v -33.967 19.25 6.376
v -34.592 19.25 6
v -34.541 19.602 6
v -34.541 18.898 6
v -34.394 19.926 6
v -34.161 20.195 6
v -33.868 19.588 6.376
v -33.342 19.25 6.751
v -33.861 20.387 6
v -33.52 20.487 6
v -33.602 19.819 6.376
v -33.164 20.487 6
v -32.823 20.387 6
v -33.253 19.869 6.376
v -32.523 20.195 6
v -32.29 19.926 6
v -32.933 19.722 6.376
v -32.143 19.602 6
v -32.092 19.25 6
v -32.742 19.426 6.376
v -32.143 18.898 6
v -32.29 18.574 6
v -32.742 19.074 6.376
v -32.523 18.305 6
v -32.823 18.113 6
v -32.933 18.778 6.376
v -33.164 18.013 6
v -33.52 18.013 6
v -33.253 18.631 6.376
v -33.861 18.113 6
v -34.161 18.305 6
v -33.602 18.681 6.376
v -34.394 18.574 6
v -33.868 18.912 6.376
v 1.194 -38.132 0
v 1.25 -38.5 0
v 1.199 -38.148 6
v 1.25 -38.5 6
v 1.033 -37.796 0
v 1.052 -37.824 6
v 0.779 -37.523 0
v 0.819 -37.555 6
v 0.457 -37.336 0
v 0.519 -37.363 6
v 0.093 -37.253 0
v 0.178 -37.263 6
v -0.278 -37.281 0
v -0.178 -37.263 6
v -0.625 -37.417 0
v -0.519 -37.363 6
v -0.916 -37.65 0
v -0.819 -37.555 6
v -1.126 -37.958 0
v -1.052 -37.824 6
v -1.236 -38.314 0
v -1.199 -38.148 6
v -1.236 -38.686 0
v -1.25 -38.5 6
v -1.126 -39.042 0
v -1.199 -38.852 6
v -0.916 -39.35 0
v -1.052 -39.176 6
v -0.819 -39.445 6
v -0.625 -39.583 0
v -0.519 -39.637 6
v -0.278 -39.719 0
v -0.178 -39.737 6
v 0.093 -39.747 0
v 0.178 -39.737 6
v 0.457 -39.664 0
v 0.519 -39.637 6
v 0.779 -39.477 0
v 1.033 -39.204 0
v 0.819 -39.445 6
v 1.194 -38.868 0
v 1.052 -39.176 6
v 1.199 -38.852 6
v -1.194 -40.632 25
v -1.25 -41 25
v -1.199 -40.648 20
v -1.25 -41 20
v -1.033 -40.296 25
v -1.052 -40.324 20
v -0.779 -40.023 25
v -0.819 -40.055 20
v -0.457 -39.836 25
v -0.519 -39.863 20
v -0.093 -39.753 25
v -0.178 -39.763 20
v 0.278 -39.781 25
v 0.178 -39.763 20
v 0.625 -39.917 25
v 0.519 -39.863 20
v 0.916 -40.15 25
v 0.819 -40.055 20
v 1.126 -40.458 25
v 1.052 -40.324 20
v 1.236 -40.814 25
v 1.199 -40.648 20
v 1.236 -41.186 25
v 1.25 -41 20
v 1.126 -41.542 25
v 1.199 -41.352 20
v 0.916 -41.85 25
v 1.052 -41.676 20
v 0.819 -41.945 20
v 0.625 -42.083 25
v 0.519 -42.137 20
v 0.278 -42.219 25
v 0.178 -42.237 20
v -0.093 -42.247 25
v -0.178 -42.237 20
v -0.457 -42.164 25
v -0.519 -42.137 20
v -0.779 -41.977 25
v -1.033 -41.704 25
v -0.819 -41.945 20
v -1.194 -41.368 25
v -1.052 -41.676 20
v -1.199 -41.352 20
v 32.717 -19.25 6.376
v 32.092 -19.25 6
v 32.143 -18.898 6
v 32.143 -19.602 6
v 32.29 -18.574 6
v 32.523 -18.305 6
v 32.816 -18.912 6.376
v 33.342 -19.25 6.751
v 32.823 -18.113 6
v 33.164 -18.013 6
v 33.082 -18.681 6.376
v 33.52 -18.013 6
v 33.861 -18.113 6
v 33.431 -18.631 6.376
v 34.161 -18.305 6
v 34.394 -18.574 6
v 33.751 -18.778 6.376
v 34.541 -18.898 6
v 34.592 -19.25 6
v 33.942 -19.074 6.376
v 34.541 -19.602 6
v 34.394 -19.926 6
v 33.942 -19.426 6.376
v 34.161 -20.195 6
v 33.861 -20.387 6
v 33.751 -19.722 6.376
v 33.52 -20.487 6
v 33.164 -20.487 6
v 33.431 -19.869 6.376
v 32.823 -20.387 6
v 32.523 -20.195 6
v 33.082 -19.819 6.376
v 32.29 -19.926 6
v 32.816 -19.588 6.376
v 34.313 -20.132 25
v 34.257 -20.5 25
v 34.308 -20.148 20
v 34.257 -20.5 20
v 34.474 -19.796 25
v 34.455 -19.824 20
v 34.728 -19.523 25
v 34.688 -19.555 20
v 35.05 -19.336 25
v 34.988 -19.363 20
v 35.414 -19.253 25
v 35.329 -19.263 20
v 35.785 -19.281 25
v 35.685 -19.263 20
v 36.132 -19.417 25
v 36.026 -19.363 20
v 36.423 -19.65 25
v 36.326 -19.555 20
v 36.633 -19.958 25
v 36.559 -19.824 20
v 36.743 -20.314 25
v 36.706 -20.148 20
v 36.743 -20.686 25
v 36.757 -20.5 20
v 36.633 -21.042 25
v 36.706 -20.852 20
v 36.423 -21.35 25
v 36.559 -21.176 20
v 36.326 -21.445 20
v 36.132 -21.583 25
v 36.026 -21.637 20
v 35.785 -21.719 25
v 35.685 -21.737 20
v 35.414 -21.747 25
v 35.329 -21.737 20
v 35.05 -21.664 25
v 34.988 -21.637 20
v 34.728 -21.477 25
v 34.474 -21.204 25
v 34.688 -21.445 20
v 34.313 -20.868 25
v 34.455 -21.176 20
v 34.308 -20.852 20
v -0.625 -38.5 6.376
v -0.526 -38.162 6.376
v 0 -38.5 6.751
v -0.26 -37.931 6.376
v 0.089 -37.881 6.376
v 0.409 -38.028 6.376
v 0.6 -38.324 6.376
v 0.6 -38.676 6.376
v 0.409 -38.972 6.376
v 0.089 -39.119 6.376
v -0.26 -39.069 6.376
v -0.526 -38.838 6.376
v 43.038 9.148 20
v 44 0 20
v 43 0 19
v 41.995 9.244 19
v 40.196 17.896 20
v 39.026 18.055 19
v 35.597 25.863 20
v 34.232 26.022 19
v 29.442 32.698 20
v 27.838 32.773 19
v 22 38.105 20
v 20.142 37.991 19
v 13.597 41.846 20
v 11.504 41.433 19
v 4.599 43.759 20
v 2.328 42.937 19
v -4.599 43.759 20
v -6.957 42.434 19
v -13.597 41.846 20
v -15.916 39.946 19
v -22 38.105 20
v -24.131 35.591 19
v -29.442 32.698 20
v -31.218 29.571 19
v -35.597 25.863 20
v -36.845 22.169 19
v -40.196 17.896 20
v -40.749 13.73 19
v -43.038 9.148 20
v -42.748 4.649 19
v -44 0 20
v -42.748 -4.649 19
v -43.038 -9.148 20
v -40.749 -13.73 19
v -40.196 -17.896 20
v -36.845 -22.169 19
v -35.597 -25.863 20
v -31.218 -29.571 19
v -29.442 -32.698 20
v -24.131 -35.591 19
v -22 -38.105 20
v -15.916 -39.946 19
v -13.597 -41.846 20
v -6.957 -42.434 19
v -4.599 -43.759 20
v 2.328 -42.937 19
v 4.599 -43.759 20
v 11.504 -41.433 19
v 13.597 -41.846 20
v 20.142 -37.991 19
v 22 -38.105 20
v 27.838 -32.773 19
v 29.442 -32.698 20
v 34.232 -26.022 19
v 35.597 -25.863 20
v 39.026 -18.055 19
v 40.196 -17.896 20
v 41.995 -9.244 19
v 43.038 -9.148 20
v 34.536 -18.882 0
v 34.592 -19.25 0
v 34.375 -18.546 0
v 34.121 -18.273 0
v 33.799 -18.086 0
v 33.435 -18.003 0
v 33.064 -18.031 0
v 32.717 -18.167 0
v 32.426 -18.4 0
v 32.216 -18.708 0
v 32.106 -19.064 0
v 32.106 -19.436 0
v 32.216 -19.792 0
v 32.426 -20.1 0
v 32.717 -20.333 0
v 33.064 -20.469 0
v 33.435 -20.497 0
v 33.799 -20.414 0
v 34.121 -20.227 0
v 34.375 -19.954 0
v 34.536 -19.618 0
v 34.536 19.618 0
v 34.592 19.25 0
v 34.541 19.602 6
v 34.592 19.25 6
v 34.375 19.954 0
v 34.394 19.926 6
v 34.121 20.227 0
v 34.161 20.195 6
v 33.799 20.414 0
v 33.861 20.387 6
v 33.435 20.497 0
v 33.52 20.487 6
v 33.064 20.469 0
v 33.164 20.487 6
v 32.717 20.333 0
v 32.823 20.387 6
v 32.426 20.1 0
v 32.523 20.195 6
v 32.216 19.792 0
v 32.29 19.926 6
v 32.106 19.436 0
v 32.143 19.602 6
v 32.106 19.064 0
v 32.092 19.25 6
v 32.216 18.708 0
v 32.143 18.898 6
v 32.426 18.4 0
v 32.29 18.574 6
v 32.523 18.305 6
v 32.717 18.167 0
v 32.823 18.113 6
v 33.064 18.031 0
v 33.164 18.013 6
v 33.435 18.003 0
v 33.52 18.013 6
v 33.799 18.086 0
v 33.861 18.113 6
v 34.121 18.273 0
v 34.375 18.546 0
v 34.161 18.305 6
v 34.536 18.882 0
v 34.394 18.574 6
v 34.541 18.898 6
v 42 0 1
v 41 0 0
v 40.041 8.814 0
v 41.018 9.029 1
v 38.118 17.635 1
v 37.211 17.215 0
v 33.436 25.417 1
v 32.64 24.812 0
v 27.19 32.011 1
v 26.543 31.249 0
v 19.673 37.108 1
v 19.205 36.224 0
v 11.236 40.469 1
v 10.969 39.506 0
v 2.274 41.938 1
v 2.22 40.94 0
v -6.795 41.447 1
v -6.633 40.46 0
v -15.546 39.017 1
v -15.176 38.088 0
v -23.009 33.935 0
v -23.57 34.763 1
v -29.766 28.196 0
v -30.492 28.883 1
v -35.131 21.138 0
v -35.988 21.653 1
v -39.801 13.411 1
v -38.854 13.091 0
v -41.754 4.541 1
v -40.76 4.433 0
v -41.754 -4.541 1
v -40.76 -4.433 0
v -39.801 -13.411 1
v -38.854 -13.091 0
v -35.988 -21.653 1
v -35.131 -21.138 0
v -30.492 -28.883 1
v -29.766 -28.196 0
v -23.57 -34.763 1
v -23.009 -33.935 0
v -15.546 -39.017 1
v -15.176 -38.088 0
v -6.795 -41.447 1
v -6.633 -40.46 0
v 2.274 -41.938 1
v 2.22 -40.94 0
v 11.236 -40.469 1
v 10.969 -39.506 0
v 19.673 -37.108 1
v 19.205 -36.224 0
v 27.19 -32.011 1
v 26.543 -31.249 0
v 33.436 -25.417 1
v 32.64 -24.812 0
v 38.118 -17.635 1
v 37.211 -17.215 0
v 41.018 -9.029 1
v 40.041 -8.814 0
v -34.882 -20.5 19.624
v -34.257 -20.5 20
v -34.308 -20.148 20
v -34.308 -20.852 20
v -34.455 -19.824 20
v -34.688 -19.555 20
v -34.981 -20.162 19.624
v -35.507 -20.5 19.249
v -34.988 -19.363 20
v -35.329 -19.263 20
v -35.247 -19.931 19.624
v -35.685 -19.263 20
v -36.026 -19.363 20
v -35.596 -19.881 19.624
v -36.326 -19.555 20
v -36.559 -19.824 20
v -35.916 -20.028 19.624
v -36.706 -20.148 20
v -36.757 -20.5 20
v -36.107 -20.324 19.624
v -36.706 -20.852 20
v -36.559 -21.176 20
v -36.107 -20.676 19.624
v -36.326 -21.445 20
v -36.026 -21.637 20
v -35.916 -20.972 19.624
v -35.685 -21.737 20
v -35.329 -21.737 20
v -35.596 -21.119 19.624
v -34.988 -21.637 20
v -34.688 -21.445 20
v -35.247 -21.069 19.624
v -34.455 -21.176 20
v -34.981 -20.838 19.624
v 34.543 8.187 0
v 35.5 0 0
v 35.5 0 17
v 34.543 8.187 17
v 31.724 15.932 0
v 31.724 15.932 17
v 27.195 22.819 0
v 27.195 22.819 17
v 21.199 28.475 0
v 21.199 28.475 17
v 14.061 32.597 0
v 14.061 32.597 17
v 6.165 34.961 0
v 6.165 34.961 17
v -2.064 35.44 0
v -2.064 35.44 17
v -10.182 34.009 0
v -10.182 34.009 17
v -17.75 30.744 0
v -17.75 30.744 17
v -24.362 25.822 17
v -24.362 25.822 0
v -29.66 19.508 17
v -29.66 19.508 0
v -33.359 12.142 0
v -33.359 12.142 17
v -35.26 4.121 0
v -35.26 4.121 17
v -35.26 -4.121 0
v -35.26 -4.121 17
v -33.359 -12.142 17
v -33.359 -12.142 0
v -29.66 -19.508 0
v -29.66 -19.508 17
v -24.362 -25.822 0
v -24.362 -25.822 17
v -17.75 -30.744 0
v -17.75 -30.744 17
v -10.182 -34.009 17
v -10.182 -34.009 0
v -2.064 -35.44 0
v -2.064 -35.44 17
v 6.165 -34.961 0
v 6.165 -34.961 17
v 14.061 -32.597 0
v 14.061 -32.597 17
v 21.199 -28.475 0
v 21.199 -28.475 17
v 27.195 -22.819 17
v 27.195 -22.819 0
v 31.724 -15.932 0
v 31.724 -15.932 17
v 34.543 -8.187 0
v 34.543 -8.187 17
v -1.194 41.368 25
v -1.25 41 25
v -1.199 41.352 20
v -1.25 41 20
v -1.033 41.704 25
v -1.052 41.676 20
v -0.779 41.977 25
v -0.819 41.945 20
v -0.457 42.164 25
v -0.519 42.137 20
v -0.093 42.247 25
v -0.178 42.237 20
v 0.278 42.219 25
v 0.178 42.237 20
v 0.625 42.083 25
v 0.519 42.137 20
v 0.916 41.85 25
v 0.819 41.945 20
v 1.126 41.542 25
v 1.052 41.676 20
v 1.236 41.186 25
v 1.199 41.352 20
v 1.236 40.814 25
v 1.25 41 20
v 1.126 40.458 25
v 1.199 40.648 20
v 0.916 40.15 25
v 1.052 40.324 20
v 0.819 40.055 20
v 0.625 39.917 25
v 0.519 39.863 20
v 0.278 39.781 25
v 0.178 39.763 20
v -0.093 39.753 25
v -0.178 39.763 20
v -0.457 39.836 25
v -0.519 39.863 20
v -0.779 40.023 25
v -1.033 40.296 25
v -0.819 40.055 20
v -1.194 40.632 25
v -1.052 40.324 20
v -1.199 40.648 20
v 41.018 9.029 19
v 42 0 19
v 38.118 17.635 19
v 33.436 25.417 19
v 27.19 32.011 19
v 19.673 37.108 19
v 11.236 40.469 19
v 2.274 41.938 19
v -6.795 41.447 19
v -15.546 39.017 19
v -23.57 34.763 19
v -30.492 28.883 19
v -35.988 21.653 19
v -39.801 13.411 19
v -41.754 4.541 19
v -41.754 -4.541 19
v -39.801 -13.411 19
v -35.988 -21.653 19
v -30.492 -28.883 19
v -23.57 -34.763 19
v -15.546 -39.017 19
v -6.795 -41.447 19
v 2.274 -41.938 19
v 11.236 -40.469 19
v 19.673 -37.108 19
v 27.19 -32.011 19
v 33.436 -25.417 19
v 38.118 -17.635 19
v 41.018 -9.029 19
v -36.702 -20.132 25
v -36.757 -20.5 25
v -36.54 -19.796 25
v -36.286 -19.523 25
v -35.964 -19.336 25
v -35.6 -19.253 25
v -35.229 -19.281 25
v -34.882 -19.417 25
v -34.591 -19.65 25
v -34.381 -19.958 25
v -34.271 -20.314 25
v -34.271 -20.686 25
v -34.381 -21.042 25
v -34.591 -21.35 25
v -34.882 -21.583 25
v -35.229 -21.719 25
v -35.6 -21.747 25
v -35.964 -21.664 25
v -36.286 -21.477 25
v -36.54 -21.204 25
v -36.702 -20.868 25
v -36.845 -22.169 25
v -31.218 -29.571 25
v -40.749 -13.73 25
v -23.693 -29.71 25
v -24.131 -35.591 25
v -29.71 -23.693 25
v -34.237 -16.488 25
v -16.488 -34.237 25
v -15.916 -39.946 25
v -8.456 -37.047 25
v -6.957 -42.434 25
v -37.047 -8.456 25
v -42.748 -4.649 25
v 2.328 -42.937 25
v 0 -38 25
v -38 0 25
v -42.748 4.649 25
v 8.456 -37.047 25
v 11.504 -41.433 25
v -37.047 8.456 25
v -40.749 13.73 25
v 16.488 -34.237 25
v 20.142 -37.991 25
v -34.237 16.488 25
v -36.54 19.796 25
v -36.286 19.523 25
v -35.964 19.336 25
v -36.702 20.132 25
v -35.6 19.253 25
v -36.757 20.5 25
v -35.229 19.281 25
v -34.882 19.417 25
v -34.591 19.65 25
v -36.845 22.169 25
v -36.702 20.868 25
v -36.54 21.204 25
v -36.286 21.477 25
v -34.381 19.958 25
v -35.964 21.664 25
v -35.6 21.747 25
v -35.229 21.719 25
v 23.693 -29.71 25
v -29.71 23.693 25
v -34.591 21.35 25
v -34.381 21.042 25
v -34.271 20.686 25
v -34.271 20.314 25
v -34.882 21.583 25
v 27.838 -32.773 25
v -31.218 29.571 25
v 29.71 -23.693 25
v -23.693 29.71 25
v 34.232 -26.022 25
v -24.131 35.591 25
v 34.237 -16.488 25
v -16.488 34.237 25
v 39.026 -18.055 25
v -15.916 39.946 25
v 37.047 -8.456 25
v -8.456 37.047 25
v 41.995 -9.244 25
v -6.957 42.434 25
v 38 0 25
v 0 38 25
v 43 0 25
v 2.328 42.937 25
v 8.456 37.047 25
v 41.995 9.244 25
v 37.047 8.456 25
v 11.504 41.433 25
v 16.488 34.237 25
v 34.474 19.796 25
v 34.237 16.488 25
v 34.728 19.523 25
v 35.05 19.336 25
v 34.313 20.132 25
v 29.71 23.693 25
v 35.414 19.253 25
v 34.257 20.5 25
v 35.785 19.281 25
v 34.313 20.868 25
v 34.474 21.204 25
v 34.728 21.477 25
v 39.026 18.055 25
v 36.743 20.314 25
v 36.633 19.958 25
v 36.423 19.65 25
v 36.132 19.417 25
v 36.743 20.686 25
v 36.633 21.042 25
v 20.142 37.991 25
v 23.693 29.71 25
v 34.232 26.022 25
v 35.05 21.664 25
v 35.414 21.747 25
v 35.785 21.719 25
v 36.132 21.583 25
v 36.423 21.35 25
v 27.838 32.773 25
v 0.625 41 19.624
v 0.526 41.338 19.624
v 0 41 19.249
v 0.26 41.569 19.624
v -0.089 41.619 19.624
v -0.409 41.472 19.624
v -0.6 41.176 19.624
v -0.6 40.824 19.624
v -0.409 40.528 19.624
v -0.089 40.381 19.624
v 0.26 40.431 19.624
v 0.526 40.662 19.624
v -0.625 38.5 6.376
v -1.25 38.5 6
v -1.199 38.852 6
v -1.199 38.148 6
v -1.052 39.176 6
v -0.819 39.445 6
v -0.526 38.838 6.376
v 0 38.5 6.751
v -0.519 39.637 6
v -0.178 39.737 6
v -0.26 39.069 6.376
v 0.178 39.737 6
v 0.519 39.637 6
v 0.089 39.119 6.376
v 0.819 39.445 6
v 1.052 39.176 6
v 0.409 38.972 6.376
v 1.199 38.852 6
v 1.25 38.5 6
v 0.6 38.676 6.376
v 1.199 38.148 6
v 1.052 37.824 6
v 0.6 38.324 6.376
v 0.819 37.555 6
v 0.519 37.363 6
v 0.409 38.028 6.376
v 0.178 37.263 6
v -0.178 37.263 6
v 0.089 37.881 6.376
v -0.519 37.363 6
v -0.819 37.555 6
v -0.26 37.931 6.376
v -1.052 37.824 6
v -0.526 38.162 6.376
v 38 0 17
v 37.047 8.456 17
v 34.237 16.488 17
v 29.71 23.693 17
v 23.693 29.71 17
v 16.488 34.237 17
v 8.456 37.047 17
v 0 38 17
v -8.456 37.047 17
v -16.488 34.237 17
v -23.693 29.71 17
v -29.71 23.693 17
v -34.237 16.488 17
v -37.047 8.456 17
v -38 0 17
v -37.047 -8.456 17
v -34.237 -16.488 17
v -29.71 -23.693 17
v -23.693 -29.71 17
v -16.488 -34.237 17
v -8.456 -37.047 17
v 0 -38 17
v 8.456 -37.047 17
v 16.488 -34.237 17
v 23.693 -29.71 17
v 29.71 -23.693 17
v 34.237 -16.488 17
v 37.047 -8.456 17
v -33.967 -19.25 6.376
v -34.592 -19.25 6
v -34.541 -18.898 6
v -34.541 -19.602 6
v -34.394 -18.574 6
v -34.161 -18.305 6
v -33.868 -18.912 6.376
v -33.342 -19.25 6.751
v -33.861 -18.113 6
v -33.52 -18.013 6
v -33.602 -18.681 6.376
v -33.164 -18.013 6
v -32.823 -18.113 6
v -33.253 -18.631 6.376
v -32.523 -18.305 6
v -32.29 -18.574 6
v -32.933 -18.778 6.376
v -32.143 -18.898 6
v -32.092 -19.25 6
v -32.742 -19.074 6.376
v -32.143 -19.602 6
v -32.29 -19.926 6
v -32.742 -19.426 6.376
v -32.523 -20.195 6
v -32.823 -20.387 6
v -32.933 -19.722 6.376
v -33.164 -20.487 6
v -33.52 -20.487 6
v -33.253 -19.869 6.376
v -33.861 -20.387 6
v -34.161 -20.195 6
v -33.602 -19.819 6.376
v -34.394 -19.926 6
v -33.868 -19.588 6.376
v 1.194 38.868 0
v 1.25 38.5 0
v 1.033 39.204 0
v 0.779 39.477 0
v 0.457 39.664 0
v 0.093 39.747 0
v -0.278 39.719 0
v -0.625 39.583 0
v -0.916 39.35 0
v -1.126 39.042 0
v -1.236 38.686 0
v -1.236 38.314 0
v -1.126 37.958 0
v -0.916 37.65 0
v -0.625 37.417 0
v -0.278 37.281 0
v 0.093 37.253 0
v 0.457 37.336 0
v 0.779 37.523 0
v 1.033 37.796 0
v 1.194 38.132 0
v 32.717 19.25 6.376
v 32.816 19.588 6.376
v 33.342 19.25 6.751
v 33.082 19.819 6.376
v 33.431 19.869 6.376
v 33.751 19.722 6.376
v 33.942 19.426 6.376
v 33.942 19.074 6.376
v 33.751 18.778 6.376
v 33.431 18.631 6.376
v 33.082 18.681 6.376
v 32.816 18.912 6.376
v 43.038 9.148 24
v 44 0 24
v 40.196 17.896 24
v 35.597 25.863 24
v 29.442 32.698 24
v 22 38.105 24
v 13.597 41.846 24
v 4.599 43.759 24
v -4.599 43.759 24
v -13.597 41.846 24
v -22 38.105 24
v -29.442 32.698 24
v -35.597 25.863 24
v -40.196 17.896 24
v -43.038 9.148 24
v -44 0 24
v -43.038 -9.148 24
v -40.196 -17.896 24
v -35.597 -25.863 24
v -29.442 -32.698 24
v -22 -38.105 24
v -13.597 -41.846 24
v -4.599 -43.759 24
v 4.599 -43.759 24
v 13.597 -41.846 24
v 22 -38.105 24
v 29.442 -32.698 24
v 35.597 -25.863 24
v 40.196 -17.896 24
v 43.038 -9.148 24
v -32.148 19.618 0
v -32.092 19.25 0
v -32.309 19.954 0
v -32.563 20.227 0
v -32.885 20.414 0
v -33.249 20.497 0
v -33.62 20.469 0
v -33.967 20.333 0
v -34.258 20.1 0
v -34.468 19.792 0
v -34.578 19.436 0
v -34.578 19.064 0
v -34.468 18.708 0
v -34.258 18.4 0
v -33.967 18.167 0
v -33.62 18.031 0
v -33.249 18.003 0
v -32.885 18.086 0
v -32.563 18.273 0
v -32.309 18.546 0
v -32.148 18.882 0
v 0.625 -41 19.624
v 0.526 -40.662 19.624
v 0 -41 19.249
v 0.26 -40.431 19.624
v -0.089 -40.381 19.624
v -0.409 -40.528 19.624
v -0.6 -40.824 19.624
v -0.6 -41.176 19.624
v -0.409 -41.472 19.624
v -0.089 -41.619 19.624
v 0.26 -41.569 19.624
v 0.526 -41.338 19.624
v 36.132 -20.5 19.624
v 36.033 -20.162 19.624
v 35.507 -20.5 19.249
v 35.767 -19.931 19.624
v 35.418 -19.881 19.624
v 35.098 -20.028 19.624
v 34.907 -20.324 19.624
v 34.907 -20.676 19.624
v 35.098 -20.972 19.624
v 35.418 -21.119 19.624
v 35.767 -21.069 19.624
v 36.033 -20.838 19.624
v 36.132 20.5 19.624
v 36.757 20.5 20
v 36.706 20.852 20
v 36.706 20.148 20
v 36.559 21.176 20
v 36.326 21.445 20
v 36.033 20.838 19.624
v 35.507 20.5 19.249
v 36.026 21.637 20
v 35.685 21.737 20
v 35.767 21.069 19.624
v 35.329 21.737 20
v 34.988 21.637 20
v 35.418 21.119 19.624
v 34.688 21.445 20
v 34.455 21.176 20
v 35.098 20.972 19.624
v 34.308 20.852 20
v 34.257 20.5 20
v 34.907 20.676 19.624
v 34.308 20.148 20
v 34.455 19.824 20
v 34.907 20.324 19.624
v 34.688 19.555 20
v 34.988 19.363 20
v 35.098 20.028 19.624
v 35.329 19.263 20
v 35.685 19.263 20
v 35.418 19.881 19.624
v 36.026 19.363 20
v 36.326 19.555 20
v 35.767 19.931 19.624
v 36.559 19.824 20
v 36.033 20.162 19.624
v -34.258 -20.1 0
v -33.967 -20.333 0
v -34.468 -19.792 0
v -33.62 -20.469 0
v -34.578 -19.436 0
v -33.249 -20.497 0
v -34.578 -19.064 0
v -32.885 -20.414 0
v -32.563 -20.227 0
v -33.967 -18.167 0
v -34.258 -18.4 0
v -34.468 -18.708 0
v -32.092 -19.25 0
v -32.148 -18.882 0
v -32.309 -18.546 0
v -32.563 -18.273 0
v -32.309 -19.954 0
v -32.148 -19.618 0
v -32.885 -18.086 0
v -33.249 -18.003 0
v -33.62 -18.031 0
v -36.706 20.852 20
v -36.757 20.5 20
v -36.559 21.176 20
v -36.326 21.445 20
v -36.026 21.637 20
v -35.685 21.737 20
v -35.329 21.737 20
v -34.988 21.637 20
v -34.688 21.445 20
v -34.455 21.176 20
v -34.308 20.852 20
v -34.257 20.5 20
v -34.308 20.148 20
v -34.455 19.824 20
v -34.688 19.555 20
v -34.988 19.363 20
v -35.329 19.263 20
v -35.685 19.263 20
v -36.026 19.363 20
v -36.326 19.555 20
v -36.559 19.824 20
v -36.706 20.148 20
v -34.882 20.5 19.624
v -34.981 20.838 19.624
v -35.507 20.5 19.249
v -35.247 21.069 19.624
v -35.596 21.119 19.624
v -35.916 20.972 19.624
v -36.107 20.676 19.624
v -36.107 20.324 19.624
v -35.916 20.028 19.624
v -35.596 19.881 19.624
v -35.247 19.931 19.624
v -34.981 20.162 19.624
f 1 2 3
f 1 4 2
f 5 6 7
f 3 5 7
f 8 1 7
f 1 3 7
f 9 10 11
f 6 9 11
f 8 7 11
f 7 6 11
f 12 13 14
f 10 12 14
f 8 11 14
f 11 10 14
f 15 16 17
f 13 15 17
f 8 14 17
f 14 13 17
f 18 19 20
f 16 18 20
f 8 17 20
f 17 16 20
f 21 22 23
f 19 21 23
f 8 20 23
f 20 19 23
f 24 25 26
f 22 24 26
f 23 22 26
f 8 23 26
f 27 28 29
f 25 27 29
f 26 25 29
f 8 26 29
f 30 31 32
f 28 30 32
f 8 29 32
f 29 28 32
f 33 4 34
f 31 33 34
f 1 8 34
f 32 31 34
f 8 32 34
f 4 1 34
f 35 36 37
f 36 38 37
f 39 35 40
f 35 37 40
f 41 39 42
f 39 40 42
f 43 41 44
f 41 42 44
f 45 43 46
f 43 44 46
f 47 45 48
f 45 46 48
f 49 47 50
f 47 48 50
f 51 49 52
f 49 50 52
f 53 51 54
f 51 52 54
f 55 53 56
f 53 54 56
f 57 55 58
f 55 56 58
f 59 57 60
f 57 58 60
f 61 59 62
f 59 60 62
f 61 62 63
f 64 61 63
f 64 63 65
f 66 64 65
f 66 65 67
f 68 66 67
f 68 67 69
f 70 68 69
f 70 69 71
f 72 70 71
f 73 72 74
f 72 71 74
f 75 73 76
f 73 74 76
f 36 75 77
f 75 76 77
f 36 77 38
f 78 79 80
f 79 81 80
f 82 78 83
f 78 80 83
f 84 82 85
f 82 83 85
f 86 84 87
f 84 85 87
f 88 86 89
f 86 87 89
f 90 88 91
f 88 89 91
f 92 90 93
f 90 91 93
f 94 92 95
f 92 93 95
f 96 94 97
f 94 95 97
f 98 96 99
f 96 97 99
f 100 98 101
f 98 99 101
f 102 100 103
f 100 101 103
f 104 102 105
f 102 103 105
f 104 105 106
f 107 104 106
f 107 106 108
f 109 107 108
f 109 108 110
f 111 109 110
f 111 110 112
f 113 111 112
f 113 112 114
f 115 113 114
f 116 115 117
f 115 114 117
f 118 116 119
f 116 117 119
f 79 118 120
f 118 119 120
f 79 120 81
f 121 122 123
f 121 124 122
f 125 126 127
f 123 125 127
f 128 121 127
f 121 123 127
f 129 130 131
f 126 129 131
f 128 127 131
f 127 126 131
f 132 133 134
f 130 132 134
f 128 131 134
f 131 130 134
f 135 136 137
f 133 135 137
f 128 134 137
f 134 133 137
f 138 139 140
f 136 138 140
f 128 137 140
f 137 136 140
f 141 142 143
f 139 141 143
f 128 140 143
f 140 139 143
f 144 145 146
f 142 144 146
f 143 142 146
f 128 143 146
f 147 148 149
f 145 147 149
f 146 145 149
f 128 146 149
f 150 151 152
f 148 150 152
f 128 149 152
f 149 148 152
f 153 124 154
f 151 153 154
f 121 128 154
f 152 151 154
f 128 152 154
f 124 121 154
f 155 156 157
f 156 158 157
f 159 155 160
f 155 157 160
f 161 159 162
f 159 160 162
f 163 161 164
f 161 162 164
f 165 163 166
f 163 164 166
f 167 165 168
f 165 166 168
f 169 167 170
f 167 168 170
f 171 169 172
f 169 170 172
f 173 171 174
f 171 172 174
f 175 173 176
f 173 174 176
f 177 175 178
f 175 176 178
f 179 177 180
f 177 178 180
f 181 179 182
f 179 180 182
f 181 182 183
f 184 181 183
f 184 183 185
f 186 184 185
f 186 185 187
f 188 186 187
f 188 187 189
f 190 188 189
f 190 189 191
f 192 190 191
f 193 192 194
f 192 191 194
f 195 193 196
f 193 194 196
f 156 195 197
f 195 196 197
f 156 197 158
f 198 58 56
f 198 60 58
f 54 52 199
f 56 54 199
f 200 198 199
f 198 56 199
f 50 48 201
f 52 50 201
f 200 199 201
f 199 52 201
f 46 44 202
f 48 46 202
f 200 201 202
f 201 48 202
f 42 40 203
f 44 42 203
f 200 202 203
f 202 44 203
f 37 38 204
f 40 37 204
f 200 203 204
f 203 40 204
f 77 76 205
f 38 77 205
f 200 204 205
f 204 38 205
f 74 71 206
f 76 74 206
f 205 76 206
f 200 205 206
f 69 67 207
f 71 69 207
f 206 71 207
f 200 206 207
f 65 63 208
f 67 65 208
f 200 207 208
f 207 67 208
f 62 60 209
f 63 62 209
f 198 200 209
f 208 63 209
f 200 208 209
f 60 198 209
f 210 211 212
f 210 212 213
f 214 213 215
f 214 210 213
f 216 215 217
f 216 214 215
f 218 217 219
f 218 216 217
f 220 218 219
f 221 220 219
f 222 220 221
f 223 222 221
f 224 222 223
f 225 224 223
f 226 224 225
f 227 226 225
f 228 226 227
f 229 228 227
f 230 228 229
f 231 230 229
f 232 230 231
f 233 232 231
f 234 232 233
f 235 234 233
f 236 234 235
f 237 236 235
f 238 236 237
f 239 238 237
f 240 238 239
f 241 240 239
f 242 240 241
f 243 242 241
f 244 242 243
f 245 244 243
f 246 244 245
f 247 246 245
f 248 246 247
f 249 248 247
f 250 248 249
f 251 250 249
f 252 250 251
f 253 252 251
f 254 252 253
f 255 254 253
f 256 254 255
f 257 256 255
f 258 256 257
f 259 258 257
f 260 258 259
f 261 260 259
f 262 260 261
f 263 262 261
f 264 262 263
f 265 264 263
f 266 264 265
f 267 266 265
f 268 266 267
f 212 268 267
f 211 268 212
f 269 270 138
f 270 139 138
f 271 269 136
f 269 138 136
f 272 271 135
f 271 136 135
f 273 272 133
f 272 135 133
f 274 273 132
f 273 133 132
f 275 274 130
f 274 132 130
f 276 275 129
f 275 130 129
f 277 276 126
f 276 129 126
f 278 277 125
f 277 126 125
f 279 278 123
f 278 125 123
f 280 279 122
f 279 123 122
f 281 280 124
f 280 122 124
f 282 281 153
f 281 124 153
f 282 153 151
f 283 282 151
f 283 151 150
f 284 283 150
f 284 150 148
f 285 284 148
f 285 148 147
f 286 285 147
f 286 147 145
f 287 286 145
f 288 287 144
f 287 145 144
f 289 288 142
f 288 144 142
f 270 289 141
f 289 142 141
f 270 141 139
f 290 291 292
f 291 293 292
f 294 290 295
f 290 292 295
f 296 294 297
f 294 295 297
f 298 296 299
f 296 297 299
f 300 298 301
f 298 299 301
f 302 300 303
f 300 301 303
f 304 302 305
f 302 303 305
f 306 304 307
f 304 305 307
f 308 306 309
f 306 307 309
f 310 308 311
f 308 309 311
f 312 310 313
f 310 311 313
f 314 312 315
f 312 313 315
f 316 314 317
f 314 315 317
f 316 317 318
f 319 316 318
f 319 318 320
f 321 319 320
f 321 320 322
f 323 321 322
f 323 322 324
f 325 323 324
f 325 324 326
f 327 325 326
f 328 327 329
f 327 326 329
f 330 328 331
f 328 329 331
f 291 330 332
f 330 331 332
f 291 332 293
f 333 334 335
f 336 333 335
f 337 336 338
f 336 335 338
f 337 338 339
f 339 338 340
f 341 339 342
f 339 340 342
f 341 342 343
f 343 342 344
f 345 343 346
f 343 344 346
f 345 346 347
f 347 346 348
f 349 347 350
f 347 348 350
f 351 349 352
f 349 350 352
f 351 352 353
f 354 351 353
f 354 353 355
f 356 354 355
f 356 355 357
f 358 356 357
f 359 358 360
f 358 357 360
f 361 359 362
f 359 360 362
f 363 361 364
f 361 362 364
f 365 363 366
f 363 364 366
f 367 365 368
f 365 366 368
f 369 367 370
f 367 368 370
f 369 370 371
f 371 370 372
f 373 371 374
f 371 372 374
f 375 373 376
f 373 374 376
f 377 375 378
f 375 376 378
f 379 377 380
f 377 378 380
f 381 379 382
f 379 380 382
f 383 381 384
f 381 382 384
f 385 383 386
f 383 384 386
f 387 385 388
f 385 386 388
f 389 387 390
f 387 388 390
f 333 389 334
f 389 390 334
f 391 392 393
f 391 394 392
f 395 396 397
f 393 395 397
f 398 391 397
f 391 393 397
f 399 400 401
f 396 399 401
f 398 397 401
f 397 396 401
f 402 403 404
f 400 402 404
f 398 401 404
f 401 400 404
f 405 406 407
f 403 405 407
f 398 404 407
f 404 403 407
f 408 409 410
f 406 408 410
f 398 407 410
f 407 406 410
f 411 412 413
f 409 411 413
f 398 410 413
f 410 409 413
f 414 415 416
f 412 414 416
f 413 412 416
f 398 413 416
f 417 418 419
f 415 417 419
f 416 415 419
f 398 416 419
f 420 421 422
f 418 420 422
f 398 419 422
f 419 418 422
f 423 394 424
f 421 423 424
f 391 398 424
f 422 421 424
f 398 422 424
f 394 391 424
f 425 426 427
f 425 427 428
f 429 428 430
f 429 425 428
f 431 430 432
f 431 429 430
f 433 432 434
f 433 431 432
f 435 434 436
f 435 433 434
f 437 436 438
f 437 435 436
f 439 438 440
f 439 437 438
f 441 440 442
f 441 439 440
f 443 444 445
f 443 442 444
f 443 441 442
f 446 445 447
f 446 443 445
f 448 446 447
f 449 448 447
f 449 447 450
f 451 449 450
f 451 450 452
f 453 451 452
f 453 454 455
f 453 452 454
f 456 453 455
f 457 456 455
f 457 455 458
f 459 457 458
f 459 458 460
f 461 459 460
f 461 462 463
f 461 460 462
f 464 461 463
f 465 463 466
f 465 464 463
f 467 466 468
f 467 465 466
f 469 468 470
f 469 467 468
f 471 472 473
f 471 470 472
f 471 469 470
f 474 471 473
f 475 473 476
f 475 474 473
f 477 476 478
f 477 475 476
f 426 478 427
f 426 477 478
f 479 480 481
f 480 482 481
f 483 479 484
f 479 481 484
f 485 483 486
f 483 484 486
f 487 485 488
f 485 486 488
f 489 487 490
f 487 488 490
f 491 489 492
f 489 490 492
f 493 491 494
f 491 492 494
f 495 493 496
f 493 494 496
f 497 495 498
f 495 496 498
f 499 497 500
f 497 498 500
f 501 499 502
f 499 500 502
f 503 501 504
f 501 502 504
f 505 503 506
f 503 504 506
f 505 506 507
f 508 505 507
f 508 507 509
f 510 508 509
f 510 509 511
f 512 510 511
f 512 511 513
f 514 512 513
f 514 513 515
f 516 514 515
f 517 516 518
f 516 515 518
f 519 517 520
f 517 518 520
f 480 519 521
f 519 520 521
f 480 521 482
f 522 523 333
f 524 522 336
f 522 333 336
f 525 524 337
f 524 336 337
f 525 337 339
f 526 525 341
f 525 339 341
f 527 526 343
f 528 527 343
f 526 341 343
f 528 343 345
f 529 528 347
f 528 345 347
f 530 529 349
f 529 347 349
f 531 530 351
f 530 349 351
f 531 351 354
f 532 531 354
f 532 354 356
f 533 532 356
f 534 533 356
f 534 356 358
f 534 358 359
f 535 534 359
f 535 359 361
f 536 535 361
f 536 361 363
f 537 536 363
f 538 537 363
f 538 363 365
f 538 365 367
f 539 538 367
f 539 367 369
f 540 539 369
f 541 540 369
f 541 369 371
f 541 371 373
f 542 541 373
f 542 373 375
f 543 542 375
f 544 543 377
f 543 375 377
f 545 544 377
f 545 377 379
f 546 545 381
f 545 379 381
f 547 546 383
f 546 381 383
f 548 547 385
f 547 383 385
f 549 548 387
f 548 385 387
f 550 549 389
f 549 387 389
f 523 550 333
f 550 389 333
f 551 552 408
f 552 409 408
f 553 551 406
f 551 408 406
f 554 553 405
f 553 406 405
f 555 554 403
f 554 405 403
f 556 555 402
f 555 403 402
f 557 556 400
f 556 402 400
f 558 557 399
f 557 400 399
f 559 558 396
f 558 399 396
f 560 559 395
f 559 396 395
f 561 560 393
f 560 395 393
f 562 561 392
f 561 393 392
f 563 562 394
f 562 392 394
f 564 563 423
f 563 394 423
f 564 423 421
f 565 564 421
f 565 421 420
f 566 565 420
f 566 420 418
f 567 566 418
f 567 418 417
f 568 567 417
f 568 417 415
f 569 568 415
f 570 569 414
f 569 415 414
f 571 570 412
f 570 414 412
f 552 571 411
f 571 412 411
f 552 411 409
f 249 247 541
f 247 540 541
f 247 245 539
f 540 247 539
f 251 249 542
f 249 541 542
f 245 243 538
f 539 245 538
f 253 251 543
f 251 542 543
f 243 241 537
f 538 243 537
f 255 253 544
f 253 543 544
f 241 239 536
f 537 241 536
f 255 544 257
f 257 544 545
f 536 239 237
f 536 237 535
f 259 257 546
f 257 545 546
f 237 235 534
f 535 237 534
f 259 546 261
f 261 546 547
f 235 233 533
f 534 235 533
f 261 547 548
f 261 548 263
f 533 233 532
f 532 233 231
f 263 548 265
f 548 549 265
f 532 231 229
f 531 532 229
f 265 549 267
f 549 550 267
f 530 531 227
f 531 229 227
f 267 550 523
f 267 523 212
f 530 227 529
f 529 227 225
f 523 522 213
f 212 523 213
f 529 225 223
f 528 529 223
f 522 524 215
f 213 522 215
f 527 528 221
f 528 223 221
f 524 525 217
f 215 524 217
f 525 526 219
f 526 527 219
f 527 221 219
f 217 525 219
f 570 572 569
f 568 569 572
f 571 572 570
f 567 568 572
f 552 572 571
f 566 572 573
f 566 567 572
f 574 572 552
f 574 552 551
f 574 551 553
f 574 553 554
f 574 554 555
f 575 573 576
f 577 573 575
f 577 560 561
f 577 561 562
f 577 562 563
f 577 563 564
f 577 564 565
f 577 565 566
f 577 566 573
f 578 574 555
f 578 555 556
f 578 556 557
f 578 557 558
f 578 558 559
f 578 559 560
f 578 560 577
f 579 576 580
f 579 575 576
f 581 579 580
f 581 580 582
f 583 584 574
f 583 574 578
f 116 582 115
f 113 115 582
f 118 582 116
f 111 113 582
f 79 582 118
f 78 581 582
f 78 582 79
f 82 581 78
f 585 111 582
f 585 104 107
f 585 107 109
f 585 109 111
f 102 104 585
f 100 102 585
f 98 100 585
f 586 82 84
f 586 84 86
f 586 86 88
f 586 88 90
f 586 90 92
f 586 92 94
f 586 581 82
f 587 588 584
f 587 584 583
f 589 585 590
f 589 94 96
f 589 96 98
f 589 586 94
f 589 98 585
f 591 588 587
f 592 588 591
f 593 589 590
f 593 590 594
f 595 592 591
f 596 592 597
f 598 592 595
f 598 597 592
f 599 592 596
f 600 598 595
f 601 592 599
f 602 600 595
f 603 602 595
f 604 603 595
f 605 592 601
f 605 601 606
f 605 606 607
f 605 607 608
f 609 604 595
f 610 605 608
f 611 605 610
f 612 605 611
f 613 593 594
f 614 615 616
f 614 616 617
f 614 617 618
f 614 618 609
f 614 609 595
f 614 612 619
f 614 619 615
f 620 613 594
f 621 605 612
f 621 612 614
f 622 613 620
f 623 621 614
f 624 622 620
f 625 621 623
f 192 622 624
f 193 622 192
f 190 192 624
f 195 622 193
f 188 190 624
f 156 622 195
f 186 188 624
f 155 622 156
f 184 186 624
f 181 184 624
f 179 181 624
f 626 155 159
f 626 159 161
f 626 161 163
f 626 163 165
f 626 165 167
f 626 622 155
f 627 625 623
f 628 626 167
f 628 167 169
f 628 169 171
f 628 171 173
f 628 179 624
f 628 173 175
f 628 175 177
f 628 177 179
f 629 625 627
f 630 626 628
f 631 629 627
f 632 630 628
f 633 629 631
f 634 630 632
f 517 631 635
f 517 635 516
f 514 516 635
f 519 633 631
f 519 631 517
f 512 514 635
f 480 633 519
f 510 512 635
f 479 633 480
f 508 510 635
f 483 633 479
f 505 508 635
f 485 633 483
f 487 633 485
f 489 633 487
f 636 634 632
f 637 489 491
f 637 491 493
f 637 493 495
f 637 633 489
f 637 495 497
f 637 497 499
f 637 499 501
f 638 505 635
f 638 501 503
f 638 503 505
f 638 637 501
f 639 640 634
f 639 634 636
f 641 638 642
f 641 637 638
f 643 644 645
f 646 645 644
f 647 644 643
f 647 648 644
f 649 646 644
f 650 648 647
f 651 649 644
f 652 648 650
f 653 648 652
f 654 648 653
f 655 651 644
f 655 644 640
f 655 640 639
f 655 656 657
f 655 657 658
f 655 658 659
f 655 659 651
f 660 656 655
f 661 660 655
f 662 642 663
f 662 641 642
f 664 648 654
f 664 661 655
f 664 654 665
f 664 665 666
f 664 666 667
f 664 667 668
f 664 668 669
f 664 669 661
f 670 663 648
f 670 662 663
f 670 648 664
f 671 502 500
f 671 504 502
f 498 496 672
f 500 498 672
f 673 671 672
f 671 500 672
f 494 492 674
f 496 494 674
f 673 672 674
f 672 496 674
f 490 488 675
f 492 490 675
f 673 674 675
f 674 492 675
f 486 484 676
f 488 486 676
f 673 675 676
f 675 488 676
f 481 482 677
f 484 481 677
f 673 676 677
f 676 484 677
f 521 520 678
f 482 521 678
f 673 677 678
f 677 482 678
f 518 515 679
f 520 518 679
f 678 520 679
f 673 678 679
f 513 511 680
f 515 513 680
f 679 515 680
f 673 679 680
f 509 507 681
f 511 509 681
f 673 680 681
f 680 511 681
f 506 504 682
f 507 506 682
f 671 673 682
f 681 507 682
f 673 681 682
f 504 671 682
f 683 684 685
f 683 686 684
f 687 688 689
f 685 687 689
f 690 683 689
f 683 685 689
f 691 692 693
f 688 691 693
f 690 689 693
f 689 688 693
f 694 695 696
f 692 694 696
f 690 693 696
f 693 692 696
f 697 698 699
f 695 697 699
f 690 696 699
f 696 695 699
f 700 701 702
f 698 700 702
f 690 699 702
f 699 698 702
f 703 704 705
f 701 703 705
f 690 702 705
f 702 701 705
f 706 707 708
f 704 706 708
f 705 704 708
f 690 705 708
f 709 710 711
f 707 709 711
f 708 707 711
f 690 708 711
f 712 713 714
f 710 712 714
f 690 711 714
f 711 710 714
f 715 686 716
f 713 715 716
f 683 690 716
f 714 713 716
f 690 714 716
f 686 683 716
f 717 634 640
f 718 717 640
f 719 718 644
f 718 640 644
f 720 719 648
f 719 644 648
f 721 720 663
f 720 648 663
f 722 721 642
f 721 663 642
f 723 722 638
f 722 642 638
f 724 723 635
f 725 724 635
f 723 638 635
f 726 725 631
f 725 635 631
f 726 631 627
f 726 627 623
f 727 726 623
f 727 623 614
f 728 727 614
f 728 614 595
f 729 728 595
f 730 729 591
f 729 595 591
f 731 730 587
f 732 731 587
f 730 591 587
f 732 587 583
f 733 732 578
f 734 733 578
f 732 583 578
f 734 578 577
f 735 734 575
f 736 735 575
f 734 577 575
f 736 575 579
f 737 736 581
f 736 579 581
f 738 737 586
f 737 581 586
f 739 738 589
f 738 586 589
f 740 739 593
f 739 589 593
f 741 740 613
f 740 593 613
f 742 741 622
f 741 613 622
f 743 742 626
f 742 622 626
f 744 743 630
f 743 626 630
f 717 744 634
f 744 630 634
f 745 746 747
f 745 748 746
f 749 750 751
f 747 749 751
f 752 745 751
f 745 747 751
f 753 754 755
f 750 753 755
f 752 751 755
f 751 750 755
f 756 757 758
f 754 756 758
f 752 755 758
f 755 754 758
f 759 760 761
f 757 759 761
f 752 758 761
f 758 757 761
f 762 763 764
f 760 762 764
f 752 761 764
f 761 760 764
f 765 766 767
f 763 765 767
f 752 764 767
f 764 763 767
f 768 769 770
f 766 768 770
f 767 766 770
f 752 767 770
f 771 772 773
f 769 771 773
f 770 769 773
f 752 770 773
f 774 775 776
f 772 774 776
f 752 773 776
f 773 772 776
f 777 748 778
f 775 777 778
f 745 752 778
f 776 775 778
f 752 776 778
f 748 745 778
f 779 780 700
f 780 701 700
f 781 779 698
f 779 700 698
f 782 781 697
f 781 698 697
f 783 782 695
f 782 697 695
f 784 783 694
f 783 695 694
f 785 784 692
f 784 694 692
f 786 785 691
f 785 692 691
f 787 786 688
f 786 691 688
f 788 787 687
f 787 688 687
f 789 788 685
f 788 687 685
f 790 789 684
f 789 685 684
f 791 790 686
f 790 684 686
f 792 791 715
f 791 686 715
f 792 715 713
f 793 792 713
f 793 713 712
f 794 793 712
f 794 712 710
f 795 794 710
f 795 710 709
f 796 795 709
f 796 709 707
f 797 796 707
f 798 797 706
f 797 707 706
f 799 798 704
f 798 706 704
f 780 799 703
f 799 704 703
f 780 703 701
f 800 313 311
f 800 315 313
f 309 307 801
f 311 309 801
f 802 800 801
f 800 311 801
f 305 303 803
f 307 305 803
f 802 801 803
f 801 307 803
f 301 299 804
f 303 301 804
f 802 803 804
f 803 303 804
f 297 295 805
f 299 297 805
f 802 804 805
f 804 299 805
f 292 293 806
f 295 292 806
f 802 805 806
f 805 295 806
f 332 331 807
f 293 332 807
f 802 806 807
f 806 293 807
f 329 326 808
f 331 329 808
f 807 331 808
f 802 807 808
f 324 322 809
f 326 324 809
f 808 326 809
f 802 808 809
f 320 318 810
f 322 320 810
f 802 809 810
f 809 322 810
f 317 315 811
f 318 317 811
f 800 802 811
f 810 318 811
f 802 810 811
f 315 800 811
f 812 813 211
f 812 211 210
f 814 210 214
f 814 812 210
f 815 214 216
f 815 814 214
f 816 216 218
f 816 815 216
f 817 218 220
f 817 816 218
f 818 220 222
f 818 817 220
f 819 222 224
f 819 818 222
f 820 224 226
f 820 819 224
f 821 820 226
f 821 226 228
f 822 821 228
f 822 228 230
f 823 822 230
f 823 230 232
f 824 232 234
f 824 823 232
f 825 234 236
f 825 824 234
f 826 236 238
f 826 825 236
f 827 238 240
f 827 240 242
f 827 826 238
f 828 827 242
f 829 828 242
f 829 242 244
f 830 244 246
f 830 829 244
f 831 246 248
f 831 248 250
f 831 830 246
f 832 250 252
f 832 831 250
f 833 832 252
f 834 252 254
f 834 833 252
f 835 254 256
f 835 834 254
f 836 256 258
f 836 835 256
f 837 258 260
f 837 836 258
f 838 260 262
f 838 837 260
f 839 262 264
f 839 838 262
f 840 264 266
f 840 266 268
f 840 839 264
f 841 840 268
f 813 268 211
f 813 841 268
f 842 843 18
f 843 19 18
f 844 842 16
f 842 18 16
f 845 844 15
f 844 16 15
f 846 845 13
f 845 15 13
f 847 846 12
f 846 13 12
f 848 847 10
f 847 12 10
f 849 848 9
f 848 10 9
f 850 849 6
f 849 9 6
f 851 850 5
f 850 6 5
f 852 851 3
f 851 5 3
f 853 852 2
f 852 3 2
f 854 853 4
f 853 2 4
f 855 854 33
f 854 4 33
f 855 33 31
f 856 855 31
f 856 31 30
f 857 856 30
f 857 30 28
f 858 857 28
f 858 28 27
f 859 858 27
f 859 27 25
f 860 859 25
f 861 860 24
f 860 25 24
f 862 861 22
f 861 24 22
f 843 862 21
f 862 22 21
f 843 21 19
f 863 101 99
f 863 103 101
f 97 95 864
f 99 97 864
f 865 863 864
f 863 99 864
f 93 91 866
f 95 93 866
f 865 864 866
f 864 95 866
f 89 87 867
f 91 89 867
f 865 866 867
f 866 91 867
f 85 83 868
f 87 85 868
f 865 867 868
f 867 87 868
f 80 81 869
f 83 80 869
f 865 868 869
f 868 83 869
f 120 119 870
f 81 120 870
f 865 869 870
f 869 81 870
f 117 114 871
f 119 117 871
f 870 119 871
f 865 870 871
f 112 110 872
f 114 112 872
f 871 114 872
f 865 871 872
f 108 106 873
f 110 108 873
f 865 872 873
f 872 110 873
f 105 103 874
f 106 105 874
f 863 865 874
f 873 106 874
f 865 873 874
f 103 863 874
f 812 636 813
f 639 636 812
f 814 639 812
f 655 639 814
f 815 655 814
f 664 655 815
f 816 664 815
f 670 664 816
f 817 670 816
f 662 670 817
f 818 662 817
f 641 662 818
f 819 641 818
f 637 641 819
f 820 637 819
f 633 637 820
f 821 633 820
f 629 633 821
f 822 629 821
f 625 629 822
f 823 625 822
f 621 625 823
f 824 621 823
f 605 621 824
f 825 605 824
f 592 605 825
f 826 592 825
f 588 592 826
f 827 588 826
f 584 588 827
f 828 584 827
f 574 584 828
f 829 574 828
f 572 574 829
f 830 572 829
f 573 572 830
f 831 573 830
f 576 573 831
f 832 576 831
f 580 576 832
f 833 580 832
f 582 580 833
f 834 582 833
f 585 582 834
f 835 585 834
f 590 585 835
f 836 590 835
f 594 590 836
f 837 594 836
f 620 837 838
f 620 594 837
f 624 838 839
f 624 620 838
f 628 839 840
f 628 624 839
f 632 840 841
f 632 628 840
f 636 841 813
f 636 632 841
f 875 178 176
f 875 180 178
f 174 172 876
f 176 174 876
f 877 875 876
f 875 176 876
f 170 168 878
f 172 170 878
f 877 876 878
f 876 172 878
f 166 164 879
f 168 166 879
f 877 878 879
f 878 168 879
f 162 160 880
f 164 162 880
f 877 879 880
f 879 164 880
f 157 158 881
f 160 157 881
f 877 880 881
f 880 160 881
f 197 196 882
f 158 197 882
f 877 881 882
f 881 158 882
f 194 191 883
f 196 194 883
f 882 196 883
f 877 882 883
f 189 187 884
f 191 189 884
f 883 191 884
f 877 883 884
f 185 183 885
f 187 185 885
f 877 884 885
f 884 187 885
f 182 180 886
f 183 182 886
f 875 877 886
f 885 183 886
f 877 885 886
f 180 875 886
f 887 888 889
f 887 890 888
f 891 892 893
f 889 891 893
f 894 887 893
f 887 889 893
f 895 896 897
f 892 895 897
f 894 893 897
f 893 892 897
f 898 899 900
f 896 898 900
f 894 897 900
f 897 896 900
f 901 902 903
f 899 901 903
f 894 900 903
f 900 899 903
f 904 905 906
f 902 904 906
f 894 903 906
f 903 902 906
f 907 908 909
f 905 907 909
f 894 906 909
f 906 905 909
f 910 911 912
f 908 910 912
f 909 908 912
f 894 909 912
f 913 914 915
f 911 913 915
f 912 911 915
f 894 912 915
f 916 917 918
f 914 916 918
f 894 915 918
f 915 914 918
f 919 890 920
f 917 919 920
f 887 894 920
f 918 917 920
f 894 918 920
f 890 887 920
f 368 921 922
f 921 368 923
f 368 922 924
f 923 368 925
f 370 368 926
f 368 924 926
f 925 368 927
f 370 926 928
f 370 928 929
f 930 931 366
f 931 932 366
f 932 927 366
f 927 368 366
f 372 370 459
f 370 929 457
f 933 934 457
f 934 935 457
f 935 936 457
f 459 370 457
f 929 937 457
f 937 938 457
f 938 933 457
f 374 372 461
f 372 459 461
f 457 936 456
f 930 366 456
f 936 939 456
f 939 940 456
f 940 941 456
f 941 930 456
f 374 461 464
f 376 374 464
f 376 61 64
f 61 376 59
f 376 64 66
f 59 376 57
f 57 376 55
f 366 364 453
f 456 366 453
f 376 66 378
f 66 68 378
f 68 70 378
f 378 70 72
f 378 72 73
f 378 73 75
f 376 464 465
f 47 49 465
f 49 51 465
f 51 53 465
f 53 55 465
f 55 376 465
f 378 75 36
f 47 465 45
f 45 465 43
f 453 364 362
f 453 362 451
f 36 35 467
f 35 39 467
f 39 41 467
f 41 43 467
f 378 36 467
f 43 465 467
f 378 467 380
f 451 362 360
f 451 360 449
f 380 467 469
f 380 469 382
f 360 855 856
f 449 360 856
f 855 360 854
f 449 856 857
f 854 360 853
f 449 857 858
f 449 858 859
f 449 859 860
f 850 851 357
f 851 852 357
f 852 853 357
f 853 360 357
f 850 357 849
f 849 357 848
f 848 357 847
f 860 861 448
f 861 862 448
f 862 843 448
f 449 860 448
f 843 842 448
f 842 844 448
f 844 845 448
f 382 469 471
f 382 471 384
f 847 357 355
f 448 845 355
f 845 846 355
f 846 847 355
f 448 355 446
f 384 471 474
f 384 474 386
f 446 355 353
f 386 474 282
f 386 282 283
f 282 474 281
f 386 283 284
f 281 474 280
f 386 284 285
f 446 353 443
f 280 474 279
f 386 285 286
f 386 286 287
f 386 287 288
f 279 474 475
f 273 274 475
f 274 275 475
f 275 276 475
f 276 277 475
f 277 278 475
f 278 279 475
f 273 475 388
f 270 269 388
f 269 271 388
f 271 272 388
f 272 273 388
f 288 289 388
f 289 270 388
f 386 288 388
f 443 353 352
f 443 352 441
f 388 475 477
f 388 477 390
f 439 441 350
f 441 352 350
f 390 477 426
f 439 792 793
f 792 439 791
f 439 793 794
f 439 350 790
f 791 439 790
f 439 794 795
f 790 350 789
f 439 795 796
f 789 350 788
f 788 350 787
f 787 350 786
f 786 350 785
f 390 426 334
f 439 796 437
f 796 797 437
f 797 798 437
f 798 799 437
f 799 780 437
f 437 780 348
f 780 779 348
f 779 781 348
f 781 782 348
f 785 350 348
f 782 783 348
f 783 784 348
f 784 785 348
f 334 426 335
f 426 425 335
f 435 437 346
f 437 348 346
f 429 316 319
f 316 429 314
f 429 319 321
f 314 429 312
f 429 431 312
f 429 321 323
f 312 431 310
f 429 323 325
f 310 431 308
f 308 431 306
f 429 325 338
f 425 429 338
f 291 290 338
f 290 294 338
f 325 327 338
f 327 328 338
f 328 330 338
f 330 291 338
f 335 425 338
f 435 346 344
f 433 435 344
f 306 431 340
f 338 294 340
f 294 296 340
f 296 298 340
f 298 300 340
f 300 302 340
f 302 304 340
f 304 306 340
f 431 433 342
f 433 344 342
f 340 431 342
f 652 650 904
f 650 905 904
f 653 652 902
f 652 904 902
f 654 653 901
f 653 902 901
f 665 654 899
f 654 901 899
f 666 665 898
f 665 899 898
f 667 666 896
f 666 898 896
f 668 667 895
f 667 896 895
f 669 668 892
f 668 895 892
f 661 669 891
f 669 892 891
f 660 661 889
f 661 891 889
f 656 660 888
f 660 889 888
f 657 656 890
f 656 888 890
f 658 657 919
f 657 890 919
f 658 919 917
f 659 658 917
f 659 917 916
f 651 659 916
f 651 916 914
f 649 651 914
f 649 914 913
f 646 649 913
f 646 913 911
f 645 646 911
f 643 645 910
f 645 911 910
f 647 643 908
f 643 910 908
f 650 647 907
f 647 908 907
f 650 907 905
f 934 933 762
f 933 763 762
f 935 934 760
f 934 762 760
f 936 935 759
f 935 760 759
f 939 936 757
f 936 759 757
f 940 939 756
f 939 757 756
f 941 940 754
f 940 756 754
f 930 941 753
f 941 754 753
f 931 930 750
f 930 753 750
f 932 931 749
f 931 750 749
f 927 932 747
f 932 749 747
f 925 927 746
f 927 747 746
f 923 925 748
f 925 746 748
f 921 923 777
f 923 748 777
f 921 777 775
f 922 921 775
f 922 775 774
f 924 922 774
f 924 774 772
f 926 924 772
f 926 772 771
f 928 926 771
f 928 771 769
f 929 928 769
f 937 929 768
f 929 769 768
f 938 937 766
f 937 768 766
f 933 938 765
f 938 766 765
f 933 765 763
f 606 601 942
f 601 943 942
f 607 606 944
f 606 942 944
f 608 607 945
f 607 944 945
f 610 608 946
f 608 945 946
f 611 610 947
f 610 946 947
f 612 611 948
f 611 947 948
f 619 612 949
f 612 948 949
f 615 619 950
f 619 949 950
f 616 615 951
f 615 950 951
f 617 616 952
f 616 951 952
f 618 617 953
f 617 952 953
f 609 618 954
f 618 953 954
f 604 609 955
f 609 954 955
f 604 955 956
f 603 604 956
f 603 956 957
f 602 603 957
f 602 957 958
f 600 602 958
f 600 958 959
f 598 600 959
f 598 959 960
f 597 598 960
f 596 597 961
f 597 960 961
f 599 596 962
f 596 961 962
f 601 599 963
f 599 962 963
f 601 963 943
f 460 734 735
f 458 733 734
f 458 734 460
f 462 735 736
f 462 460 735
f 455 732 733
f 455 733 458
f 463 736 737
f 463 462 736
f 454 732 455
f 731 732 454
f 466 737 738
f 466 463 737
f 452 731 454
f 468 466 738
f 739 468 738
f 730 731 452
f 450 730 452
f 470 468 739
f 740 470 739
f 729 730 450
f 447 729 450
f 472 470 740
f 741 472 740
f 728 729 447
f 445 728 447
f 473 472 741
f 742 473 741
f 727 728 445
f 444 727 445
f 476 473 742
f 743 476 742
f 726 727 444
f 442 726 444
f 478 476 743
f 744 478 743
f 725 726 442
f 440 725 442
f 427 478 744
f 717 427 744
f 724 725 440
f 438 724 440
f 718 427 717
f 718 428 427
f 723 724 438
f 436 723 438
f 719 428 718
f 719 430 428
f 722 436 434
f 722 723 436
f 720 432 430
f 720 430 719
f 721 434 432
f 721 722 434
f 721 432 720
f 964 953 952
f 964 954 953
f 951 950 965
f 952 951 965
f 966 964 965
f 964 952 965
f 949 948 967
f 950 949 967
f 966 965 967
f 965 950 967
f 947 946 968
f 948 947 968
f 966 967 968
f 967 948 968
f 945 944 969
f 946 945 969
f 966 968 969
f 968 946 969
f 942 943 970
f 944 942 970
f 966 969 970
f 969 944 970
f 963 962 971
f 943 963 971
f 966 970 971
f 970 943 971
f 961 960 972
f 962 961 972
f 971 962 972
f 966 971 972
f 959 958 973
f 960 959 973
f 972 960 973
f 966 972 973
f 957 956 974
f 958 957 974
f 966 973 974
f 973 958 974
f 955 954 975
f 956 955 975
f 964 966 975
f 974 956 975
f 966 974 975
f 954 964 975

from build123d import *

# Parameters (mm, degrees)
SKETCH_1_R                       = 42
SKETCH_1_R_2                     = 35.5
EXTRUDE_1_DEPTH                  = 25
SKETCH_2_R                       = 38
CUT_EXTRUDE_1_DEPTH              = 8
HOLE_WIZARD_M3_1_D               = 2.5
HOLE_WIZARD_M3_1_DEPTH           = 6
HOLE_WIZARD_M3_1_TIP             = 0.751075774
SKETCH_10_R                      = 44
SKETCH_10_R_2                    = 42
EXTRUDE_2_DEPTH                  = 6
CHAMFER_1_SIZE                   = 1
HOLE_WIZARD_M3_3_D               = 2.5
HOLE_WIZARD_M3_3_DEPTH           = 5
HOLE_WIZARD_M3_3_TIP             = 0.751075774
HOLE_WIZARD_M3_3_ON_FACE_2_D     = 2.5
HOLE_WIZARD_M3_3_ON_FACE_2_DEPTH = 5
HOLE_WIZARD_M3_3_ON_FACE_2_TIP   = 0.751075774
CHAMFER_2_SIZE                   = 1


with BuildPart() as part:
    # 草图1 → 凸台-拉伸1 (new body)
    with BuildSketch(Plane.XY):
        Circle(SKETCH_1_R)
        Circle(SKETCH_1_R_2, mode=Mode.SUBTRACT)
    extrude(amount=EXTRUDE_1_DEPTH)

    # 草图2 → 切除-拉伸1 (cut)
    with BuildSketch(Plane.XY.offset(25)):
        Circle(SKETCH_2_R)
    extrude(amount=-CUT_EXTRUDE_1_DEPTH, mode=Mode.SUBTRACT)

    # M3 螺纹孔1
    with Locations(Plane(origin=(-33.341978046, 19.25, 0), x_dir=(-1, 0, 0), z_dir=(0, 0, -1))):
        with Locations((0, 0), (0, -38.5), (-33.341978046, -57.75), (-66.683956092, -38.5), (-66.683956092, 0), (-33.341978046, 19.25)):
            Hole(HOLE_WIZARD_M3_1_D / 2, depth=HOLE_WIZARD_M3_1_DEPTH)
            with Locations((0, 0, -(HOLE_WIZARD_M3_1_DEPTH + HOLE_WIZARD_M3_1_TIP / 2))):  # 118° drill point
                Cone(0, HOLE_WIZARD_M3_1_D / 2, HOLE_WIZARD_M3_1_TIP, mode=Mode.SUBTRACT)

    # 草图10 → 凸台-拉伸2 (add)
    with BuildSketch(Plane.XY.offset(25)):
        Circle(SKETCH_10_R)
        Circle(SKETCH_10_R_2, mode=Mode.SUBTRACT)
    extrude(amount=-EXTRUDE_2_DEPTH)

    # 倒角1
    chamfer_1_edges = [part.edges().sort_by_distance(p)[0] for p in [
        (-42, 0, 0),
    ]]
    chamfer(chamfer_1_edges, length=CHAMFER_1_SIZE)

    # M3 螺纹孔3
    with Locations(Plane(origin=(35.507041555, 20.5, 25), x_dir=(1, 0, 0), z_dir=(0, 0, 1))):
        with Locations((0, 0), (0, -41), (-35.507041555, 20.5), (-35.507041555, -61.5), (-71.01408311, -41), (-71.01408311, 0)):
            Hole(HOLE_WIZARD_M3_3_D / 2, depth=HOLE_WIZARD_M3_3_DEPTH)
            with Locations((0, 0, -(HOLE_WIZARD_M3_3_DEPTH + HOLE_WIZARD_M3_3_TIP / 2))):  # 118° drill point
                Cone(0, HOLE_WIZARD_M3_3_D / 2, HOLE_WIZARD_M3_3_TIP, mode=Mode.SUBTRACT)

    # M3 螺纹孔3 on face 2
    with Locations(Plane(origin=(84.616598131, -20.470458883, 0), x_dir=(1, 0, 0), z_dir=(0, 0, 1))):
        with Locations((0, 0)):
            Hole(HOLE_WIZARD_M3_3_ON_FACE_2_D / 2, depth=HOLE_WIZARD_M3_3_ON_FACE_2_DEPTH)
            with Locations((0, 0, -(HOLE_WIZARD_M3_3_ON_FACE_2_DEPTH + HOLE_WIZARD_M3_3_ON_FACE_2_TIP / 2))):  # 118° drill point
                Cone(0, HOLE_WIZARD_M3_3_ON_FACE_2_D / 2, HOLE_WIZARD_M3_3_ON_FACE_2_TIP, mode=Mode.SUBTRACT)

    # 倒角2
    chamfer_2_edges = [part.edges().sort_by_distance(p)[0] for p in [
        (-44, 0, 19),
        (-44, 0, 25),
    ]]
    chamfer(chamfer_2_edges, length=CHAMFER_2_SIZE)


solid = part.part
